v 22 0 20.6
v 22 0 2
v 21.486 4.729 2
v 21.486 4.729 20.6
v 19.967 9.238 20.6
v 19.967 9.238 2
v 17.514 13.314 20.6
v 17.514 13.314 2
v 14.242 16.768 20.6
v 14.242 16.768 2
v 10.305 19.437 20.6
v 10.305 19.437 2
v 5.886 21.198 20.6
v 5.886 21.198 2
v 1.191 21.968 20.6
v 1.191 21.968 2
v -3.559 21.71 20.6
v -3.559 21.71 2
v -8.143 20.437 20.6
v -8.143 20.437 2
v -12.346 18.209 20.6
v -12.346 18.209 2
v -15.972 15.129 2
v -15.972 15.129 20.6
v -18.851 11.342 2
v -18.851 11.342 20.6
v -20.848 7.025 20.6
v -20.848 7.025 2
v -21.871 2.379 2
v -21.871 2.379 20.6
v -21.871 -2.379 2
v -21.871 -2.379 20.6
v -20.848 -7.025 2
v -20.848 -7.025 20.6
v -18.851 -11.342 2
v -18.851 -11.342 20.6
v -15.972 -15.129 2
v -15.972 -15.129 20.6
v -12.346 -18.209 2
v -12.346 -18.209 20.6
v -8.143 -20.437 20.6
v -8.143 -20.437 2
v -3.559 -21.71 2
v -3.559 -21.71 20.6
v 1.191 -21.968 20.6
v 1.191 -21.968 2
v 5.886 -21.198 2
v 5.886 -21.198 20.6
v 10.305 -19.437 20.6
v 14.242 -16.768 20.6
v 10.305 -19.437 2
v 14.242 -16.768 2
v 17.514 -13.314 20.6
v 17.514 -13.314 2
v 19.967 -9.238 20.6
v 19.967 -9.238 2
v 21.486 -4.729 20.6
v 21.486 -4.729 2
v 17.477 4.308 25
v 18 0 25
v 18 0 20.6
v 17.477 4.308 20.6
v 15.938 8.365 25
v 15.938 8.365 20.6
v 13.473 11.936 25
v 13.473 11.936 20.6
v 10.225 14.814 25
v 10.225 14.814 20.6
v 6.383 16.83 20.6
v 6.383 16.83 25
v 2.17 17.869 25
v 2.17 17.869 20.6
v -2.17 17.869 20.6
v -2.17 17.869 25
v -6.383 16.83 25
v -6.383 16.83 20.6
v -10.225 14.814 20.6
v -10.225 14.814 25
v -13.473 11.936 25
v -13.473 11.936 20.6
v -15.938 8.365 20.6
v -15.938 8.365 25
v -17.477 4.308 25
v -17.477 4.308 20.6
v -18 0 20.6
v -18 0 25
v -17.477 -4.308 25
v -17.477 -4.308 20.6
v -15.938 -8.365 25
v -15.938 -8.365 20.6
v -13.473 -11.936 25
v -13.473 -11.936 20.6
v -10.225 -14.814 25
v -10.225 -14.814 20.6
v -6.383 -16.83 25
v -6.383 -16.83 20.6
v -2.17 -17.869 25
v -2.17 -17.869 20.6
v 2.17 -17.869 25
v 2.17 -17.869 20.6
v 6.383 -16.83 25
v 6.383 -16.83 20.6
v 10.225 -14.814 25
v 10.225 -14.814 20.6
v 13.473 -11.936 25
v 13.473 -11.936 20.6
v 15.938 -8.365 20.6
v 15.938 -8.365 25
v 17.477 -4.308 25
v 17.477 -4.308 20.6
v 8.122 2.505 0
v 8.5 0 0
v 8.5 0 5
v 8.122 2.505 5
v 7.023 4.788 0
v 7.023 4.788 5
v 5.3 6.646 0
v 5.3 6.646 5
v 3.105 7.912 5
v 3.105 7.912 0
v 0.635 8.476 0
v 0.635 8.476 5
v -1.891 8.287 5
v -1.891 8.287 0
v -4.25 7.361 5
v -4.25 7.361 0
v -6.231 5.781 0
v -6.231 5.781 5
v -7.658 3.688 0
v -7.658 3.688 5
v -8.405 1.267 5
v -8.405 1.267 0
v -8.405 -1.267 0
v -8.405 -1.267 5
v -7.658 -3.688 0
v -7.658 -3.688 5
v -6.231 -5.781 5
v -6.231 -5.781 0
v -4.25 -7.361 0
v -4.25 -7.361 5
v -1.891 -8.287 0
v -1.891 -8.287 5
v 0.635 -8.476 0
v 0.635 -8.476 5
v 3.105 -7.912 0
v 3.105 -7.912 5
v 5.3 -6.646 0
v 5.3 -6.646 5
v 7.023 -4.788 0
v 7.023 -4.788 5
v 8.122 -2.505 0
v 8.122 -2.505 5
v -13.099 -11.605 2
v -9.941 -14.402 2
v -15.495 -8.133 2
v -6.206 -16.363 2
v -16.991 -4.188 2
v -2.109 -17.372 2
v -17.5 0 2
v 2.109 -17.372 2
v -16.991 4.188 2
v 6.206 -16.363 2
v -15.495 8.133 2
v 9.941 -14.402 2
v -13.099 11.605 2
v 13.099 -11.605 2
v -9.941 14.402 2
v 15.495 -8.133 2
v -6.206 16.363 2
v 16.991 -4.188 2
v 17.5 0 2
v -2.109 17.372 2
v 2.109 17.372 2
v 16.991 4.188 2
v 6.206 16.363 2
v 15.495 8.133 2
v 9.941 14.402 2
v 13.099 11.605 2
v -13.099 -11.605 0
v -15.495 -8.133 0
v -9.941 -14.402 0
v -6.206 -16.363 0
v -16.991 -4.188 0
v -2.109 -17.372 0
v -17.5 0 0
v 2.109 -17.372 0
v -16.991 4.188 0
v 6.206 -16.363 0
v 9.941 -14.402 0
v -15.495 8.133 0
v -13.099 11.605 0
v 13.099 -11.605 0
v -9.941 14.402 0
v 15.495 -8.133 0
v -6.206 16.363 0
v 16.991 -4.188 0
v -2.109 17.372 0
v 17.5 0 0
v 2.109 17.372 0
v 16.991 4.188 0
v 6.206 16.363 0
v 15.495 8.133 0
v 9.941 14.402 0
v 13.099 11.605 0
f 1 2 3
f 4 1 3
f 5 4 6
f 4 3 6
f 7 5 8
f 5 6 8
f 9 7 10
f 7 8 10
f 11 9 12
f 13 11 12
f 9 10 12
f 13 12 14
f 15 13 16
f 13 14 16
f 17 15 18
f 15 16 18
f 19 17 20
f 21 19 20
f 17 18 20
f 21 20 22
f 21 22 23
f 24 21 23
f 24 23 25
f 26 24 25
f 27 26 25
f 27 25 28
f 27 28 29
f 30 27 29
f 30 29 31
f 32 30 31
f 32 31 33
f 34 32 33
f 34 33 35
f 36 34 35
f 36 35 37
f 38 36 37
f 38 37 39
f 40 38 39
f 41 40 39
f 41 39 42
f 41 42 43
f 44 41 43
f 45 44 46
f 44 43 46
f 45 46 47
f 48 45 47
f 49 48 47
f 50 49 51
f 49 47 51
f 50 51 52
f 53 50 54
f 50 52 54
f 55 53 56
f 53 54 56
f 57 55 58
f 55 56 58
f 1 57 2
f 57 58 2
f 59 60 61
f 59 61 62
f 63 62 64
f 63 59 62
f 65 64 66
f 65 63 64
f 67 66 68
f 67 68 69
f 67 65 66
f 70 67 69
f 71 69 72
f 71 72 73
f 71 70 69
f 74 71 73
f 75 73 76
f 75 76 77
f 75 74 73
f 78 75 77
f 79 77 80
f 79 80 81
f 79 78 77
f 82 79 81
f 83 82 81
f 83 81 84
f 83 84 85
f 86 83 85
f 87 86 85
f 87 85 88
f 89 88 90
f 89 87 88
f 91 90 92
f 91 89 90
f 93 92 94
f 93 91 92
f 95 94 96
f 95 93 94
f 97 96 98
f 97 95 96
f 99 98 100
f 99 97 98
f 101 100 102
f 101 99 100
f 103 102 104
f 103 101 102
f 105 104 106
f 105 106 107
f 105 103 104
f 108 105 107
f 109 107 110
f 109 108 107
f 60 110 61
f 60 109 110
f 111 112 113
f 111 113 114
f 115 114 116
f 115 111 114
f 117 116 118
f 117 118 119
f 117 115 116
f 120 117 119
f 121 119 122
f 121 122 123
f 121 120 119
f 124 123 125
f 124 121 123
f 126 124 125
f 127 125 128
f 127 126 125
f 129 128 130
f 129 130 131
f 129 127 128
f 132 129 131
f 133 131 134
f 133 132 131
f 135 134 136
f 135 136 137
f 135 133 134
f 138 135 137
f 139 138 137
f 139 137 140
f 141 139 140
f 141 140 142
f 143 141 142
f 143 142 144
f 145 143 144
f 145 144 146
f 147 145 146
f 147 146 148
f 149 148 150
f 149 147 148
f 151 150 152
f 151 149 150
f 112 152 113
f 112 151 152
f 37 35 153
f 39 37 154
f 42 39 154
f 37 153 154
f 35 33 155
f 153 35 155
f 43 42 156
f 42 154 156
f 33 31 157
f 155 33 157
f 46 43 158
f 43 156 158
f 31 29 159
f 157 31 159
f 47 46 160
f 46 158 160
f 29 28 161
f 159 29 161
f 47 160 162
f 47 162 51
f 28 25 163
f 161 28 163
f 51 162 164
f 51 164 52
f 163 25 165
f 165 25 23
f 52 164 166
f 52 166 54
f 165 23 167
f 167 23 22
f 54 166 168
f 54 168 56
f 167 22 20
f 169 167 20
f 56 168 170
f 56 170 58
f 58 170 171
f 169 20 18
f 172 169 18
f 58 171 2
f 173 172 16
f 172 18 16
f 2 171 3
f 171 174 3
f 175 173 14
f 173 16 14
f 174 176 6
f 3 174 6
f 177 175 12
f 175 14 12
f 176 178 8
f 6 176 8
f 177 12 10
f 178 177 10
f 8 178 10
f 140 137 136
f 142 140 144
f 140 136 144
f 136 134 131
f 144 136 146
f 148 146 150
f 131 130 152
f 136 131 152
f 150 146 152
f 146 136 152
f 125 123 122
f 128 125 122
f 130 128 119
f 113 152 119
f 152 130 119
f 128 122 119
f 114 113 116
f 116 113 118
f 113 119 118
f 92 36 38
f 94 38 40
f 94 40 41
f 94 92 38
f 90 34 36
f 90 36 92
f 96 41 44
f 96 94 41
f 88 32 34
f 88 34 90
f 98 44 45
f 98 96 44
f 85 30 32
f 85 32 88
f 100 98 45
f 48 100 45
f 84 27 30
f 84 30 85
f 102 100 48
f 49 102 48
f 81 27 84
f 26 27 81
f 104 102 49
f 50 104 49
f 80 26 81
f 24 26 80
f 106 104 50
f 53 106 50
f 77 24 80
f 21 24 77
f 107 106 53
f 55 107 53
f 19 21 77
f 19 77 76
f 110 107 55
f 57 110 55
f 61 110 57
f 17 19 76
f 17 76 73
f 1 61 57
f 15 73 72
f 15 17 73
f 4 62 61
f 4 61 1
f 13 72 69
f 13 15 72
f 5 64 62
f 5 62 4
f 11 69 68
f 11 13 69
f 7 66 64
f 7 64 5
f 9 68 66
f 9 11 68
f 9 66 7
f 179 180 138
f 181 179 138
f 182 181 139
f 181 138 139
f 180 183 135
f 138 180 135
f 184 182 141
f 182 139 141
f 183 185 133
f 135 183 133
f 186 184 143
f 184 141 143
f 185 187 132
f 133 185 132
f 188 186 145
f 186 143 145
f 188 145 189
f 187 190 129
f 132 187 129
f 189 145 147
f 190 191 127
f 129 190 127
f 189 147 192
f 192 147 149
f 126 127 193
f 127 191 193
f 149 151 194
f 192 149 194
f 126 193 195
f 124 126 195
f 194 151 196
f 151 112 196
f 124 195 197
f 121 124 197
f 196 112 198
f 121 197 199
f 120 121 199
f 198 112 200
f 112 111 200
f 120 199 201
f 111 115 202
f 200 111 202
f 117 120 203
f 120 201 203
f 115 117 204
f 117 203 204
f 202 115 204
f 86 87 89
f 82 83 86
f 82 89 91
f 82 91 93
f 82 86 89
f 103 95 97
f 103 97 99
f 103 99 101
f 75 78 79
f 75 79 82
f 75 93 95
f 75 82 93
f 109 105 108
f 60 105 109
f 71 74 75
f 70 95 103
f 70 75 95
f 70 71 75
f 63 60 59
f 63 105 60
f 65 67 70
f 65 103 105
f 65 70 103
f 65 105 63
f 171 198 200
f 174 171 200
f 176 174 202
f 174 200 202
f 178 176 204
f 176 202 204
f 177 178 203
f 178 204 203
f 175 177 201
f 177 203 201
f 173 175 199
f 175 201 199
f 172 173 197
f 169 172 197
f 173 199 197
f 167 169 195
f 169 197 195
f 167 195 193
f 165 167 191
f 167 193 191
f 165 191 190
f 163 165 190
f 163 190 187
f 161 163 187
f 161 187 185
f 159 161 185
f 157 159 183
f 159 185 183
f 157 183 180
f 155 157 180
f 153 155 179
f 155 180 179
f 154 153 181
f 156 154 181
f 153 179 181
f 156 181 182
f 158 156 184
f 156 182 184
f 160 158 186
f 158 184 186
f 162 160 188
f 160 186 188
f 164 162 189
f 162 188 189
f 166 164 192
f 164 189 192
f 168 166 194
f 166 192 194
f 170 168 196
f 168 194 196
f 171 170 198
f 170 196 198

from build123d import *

# Parameters (mm, degrees)
F0_R     = 22
F0_R_2   = 17.5
F0_R_3   = 8.5
F1_DEPTH = 25
F2_DEPTH = 5
F3_DEPTH = 2
F4_R     = 22
F4_R_2   = 18
F5_DEPTH = 4.4


with BuildPart() as f1:
    # F0 (on Top) → F1 (new body)
    with BuildSketch(Plane.XY):
        Circle(F0_R)
        Circle(F0_R_2, mode=Mode.SUBTRACT)
        Circle(F0_R_2)
        Circle(F0_R_3, mode=Mode.SUBTRACT)
        Circle(F0_R_3)
    extrude(amount=F1_DEPTH)

    # F0 (on Top) → F2 (cut)
    with BuildSketch(Plane.XY):
        Circle(F0_R_3)
    extrude(amount=F2_DEPTH, mode=Mode.SUBTRACT)

    # F0 (on Top) → F3 (cut)
    with BuildSketch(Plane.XY):
        Circle(F0_R)
        Circle(F0_R_2, mode=Mode.SUBTRACT)
    extrude(amount=F3_DEPTH, mode=Mode.SUBTRACT)

    # F4 (on face) → F5 (cut)
    with BuildSketch(Plane.XY.offset(25)):
        Circle(F4_R)
        Circle(F4_R_2, mode=Mode.SUBTRACT)
    extrude(amount=-F5_DEPTH, mode=Mode.SUBTRACT)


solid = f1.part
